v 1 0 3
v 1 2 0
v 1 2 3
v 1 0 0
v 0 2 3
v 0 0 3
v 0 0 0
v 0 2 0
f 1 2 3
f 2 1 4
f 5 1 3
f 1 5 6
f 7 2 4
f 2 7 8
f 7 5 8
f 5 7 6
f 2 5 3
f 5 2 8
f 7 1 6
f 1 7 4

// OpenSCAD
echo(len([1, 2], 3), sin(30, 1), abs(-1, 2), norm([3, 4], 5), is_undef(1, 2), is_num(), version_num(1), log(2, 8, 9));
module c() echo(parent_module(), parent_module("x"), parent_module(-0.5));
module p() c();
p();
echo(sign(1,2), cos(0,1), atan2(1), pow(2), cross([1,0,0]), lookup(1), ord("a","b"), is_bool(), is_string(), is_list(), is_function());
pts = [[0,5],[3,1],[3,2],[-1,9]];
echo(max(pts), min(pts));
echo(max(["abc", "abd", "ab"]), min(["b", "a", "c"]));
echo(max([1, "a"]), max(["a", 1]), max([true, 2]), max([true, false]), min([[]]));
echo(log(1,2,3), search(1,1), search(1,[1],0,5), search(undef,[undef]), is_undef());
resize([1,2,3], auto=[1,0,1]) cube(1);
echo(str("a\x00b")); x = "q\x00r"; echo(ord(x[1]));
echo($vpr, $vpt, $vpd, $vpf);
rotate($vpr) cube(1);
$h = function(x) x + 100;
echo($h(1));
module with_fn(k) { $f = function(x) x*k; children(); }
with_fn(3) echo($f(2));
g = $h; echo(g(1));
echo(($h)(1));
r = [0:2:10]; echo(r.begin, r.step, r.end, r.x, [1,2].begin);
echo(max(5), min(3, 1, 2), max([]), max("abc"), max(1, "a"));
